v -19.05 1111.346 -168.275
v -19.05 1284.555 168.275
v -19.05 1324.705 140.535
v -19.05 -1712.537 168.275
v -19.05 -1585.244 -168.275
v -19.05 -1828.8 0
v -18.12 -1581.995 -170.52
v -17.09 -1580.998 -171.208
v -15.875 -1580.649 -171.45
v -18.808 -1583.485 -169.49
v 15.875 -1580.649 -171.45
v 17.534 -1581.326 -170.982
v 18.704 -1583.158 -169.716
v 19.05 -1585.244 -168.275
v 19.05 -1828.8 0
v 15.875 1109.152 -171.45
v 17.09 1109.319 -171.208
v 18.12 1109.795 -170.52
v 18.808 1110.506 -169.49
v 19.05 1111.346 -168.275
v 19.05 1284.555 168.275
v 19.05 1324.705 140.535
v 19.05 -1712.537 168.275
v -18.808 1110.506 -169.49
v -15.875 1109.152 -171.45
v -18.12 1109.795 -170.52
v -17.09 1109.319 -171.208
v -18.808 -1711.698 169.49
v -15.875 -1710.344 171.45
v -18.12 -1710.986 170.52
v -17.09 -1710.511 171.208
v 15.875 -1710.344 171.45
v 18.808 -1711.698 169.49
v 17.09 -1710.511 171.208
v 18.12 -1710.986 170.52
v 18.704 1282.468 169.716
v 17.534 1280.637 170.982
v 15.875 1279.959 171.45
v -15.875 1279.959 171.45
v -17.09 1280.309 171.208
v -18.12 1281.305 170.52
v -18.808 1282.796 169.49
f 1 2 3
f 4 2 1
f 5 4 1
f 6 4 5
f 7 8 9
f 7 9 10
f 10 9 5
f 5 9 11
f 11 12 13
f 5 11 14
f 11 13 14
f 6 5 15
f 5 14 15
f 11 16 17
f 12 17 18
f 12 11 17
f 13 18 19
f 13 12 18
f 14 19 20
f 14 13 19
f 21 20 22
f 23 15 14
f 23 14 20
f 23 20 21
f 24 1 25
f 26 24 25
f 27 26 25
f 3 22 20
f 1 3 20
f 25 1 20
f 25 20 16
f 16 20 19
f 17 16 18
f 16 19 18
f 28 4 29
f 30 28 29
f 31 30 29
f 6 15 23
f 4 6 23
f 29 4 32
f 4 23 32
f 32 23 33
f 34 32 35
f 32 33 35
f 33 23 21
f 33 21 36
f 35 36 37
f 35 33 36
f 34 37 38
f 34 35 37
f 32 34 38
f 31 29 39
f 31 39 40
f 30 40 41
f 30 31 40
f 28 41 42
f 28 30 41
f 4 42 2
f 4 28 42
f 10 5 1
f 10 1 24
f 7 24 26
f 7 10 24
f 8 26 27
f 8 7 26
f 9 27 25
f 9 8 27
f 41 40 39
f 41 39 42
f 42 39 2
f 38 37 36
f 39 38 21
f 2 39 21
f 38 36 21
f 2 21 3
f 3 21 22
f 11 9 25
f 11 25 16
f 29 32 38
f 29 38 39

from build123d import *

# Parameters (mm, degrees)
F1_DEPTH = 1828.8
F3_DEPTH = 38.101
F5_DEPTH = 38.101


with BuildPart() as f1:
    # F0 (on Front) → F1 (new body, symmetric)
    with BuildSketch(Plane.XZ):
        with BuildLine():
            ThreePointArc((19.05, 168.275), (18.120064, 170.520064), (15.875, 171.45))
            Line((15.875, 171.45), (-15.875, 171.45))
            ThreePointArc((-15.875, 171.45), (-18.120064, 170.520064), (-19.05, 168.275))
            Line((-19.05, 168.275), (-19.05, -168.275))
            ThreePointArc((-19.05, -168.275), (-18.120064, -170.520064), (-15.875, -171.45))
            Line((-15.875, -171.45), (15.875, -171.45))
            ThreePointArc((15.875, -171.45), (18.120064, -170.520064), (19.05, -168.275))
            Line((19.05, -168.275), (19.05, 168.275))
        make_face()
    extrude(amount=F1_DEPTH, both=True)

    # F2 (on face) → F3 (cut, through all)
    with BuildSketch(Plane.YZ.offset(19.05)):
        Polygon((-1828.8, 0), (-1465.022533, 526.520019), (-2148.896933, 526.520019), (-2148.896933, -171.45), (-1580.648684, -171.45), align=None)
    extrude(amount=-F3_DEPTH, mode=Mode.SUBTRACT)

    # F4 (on face) → F5 (cut, through all)
    with BuildSketch(Plane.YZ.offset(19.05)):
        Polygon((1888.919197, 241.292967), (1178.870832, 241.292967), (1324.705192, 140.534683), (941.482801, -414.129304), (1888.919197, -414.129304), align=None)
    extrude(amount=-F5_DEPTH, mode=Mode.SUBTRACT)


solid = f1.part
